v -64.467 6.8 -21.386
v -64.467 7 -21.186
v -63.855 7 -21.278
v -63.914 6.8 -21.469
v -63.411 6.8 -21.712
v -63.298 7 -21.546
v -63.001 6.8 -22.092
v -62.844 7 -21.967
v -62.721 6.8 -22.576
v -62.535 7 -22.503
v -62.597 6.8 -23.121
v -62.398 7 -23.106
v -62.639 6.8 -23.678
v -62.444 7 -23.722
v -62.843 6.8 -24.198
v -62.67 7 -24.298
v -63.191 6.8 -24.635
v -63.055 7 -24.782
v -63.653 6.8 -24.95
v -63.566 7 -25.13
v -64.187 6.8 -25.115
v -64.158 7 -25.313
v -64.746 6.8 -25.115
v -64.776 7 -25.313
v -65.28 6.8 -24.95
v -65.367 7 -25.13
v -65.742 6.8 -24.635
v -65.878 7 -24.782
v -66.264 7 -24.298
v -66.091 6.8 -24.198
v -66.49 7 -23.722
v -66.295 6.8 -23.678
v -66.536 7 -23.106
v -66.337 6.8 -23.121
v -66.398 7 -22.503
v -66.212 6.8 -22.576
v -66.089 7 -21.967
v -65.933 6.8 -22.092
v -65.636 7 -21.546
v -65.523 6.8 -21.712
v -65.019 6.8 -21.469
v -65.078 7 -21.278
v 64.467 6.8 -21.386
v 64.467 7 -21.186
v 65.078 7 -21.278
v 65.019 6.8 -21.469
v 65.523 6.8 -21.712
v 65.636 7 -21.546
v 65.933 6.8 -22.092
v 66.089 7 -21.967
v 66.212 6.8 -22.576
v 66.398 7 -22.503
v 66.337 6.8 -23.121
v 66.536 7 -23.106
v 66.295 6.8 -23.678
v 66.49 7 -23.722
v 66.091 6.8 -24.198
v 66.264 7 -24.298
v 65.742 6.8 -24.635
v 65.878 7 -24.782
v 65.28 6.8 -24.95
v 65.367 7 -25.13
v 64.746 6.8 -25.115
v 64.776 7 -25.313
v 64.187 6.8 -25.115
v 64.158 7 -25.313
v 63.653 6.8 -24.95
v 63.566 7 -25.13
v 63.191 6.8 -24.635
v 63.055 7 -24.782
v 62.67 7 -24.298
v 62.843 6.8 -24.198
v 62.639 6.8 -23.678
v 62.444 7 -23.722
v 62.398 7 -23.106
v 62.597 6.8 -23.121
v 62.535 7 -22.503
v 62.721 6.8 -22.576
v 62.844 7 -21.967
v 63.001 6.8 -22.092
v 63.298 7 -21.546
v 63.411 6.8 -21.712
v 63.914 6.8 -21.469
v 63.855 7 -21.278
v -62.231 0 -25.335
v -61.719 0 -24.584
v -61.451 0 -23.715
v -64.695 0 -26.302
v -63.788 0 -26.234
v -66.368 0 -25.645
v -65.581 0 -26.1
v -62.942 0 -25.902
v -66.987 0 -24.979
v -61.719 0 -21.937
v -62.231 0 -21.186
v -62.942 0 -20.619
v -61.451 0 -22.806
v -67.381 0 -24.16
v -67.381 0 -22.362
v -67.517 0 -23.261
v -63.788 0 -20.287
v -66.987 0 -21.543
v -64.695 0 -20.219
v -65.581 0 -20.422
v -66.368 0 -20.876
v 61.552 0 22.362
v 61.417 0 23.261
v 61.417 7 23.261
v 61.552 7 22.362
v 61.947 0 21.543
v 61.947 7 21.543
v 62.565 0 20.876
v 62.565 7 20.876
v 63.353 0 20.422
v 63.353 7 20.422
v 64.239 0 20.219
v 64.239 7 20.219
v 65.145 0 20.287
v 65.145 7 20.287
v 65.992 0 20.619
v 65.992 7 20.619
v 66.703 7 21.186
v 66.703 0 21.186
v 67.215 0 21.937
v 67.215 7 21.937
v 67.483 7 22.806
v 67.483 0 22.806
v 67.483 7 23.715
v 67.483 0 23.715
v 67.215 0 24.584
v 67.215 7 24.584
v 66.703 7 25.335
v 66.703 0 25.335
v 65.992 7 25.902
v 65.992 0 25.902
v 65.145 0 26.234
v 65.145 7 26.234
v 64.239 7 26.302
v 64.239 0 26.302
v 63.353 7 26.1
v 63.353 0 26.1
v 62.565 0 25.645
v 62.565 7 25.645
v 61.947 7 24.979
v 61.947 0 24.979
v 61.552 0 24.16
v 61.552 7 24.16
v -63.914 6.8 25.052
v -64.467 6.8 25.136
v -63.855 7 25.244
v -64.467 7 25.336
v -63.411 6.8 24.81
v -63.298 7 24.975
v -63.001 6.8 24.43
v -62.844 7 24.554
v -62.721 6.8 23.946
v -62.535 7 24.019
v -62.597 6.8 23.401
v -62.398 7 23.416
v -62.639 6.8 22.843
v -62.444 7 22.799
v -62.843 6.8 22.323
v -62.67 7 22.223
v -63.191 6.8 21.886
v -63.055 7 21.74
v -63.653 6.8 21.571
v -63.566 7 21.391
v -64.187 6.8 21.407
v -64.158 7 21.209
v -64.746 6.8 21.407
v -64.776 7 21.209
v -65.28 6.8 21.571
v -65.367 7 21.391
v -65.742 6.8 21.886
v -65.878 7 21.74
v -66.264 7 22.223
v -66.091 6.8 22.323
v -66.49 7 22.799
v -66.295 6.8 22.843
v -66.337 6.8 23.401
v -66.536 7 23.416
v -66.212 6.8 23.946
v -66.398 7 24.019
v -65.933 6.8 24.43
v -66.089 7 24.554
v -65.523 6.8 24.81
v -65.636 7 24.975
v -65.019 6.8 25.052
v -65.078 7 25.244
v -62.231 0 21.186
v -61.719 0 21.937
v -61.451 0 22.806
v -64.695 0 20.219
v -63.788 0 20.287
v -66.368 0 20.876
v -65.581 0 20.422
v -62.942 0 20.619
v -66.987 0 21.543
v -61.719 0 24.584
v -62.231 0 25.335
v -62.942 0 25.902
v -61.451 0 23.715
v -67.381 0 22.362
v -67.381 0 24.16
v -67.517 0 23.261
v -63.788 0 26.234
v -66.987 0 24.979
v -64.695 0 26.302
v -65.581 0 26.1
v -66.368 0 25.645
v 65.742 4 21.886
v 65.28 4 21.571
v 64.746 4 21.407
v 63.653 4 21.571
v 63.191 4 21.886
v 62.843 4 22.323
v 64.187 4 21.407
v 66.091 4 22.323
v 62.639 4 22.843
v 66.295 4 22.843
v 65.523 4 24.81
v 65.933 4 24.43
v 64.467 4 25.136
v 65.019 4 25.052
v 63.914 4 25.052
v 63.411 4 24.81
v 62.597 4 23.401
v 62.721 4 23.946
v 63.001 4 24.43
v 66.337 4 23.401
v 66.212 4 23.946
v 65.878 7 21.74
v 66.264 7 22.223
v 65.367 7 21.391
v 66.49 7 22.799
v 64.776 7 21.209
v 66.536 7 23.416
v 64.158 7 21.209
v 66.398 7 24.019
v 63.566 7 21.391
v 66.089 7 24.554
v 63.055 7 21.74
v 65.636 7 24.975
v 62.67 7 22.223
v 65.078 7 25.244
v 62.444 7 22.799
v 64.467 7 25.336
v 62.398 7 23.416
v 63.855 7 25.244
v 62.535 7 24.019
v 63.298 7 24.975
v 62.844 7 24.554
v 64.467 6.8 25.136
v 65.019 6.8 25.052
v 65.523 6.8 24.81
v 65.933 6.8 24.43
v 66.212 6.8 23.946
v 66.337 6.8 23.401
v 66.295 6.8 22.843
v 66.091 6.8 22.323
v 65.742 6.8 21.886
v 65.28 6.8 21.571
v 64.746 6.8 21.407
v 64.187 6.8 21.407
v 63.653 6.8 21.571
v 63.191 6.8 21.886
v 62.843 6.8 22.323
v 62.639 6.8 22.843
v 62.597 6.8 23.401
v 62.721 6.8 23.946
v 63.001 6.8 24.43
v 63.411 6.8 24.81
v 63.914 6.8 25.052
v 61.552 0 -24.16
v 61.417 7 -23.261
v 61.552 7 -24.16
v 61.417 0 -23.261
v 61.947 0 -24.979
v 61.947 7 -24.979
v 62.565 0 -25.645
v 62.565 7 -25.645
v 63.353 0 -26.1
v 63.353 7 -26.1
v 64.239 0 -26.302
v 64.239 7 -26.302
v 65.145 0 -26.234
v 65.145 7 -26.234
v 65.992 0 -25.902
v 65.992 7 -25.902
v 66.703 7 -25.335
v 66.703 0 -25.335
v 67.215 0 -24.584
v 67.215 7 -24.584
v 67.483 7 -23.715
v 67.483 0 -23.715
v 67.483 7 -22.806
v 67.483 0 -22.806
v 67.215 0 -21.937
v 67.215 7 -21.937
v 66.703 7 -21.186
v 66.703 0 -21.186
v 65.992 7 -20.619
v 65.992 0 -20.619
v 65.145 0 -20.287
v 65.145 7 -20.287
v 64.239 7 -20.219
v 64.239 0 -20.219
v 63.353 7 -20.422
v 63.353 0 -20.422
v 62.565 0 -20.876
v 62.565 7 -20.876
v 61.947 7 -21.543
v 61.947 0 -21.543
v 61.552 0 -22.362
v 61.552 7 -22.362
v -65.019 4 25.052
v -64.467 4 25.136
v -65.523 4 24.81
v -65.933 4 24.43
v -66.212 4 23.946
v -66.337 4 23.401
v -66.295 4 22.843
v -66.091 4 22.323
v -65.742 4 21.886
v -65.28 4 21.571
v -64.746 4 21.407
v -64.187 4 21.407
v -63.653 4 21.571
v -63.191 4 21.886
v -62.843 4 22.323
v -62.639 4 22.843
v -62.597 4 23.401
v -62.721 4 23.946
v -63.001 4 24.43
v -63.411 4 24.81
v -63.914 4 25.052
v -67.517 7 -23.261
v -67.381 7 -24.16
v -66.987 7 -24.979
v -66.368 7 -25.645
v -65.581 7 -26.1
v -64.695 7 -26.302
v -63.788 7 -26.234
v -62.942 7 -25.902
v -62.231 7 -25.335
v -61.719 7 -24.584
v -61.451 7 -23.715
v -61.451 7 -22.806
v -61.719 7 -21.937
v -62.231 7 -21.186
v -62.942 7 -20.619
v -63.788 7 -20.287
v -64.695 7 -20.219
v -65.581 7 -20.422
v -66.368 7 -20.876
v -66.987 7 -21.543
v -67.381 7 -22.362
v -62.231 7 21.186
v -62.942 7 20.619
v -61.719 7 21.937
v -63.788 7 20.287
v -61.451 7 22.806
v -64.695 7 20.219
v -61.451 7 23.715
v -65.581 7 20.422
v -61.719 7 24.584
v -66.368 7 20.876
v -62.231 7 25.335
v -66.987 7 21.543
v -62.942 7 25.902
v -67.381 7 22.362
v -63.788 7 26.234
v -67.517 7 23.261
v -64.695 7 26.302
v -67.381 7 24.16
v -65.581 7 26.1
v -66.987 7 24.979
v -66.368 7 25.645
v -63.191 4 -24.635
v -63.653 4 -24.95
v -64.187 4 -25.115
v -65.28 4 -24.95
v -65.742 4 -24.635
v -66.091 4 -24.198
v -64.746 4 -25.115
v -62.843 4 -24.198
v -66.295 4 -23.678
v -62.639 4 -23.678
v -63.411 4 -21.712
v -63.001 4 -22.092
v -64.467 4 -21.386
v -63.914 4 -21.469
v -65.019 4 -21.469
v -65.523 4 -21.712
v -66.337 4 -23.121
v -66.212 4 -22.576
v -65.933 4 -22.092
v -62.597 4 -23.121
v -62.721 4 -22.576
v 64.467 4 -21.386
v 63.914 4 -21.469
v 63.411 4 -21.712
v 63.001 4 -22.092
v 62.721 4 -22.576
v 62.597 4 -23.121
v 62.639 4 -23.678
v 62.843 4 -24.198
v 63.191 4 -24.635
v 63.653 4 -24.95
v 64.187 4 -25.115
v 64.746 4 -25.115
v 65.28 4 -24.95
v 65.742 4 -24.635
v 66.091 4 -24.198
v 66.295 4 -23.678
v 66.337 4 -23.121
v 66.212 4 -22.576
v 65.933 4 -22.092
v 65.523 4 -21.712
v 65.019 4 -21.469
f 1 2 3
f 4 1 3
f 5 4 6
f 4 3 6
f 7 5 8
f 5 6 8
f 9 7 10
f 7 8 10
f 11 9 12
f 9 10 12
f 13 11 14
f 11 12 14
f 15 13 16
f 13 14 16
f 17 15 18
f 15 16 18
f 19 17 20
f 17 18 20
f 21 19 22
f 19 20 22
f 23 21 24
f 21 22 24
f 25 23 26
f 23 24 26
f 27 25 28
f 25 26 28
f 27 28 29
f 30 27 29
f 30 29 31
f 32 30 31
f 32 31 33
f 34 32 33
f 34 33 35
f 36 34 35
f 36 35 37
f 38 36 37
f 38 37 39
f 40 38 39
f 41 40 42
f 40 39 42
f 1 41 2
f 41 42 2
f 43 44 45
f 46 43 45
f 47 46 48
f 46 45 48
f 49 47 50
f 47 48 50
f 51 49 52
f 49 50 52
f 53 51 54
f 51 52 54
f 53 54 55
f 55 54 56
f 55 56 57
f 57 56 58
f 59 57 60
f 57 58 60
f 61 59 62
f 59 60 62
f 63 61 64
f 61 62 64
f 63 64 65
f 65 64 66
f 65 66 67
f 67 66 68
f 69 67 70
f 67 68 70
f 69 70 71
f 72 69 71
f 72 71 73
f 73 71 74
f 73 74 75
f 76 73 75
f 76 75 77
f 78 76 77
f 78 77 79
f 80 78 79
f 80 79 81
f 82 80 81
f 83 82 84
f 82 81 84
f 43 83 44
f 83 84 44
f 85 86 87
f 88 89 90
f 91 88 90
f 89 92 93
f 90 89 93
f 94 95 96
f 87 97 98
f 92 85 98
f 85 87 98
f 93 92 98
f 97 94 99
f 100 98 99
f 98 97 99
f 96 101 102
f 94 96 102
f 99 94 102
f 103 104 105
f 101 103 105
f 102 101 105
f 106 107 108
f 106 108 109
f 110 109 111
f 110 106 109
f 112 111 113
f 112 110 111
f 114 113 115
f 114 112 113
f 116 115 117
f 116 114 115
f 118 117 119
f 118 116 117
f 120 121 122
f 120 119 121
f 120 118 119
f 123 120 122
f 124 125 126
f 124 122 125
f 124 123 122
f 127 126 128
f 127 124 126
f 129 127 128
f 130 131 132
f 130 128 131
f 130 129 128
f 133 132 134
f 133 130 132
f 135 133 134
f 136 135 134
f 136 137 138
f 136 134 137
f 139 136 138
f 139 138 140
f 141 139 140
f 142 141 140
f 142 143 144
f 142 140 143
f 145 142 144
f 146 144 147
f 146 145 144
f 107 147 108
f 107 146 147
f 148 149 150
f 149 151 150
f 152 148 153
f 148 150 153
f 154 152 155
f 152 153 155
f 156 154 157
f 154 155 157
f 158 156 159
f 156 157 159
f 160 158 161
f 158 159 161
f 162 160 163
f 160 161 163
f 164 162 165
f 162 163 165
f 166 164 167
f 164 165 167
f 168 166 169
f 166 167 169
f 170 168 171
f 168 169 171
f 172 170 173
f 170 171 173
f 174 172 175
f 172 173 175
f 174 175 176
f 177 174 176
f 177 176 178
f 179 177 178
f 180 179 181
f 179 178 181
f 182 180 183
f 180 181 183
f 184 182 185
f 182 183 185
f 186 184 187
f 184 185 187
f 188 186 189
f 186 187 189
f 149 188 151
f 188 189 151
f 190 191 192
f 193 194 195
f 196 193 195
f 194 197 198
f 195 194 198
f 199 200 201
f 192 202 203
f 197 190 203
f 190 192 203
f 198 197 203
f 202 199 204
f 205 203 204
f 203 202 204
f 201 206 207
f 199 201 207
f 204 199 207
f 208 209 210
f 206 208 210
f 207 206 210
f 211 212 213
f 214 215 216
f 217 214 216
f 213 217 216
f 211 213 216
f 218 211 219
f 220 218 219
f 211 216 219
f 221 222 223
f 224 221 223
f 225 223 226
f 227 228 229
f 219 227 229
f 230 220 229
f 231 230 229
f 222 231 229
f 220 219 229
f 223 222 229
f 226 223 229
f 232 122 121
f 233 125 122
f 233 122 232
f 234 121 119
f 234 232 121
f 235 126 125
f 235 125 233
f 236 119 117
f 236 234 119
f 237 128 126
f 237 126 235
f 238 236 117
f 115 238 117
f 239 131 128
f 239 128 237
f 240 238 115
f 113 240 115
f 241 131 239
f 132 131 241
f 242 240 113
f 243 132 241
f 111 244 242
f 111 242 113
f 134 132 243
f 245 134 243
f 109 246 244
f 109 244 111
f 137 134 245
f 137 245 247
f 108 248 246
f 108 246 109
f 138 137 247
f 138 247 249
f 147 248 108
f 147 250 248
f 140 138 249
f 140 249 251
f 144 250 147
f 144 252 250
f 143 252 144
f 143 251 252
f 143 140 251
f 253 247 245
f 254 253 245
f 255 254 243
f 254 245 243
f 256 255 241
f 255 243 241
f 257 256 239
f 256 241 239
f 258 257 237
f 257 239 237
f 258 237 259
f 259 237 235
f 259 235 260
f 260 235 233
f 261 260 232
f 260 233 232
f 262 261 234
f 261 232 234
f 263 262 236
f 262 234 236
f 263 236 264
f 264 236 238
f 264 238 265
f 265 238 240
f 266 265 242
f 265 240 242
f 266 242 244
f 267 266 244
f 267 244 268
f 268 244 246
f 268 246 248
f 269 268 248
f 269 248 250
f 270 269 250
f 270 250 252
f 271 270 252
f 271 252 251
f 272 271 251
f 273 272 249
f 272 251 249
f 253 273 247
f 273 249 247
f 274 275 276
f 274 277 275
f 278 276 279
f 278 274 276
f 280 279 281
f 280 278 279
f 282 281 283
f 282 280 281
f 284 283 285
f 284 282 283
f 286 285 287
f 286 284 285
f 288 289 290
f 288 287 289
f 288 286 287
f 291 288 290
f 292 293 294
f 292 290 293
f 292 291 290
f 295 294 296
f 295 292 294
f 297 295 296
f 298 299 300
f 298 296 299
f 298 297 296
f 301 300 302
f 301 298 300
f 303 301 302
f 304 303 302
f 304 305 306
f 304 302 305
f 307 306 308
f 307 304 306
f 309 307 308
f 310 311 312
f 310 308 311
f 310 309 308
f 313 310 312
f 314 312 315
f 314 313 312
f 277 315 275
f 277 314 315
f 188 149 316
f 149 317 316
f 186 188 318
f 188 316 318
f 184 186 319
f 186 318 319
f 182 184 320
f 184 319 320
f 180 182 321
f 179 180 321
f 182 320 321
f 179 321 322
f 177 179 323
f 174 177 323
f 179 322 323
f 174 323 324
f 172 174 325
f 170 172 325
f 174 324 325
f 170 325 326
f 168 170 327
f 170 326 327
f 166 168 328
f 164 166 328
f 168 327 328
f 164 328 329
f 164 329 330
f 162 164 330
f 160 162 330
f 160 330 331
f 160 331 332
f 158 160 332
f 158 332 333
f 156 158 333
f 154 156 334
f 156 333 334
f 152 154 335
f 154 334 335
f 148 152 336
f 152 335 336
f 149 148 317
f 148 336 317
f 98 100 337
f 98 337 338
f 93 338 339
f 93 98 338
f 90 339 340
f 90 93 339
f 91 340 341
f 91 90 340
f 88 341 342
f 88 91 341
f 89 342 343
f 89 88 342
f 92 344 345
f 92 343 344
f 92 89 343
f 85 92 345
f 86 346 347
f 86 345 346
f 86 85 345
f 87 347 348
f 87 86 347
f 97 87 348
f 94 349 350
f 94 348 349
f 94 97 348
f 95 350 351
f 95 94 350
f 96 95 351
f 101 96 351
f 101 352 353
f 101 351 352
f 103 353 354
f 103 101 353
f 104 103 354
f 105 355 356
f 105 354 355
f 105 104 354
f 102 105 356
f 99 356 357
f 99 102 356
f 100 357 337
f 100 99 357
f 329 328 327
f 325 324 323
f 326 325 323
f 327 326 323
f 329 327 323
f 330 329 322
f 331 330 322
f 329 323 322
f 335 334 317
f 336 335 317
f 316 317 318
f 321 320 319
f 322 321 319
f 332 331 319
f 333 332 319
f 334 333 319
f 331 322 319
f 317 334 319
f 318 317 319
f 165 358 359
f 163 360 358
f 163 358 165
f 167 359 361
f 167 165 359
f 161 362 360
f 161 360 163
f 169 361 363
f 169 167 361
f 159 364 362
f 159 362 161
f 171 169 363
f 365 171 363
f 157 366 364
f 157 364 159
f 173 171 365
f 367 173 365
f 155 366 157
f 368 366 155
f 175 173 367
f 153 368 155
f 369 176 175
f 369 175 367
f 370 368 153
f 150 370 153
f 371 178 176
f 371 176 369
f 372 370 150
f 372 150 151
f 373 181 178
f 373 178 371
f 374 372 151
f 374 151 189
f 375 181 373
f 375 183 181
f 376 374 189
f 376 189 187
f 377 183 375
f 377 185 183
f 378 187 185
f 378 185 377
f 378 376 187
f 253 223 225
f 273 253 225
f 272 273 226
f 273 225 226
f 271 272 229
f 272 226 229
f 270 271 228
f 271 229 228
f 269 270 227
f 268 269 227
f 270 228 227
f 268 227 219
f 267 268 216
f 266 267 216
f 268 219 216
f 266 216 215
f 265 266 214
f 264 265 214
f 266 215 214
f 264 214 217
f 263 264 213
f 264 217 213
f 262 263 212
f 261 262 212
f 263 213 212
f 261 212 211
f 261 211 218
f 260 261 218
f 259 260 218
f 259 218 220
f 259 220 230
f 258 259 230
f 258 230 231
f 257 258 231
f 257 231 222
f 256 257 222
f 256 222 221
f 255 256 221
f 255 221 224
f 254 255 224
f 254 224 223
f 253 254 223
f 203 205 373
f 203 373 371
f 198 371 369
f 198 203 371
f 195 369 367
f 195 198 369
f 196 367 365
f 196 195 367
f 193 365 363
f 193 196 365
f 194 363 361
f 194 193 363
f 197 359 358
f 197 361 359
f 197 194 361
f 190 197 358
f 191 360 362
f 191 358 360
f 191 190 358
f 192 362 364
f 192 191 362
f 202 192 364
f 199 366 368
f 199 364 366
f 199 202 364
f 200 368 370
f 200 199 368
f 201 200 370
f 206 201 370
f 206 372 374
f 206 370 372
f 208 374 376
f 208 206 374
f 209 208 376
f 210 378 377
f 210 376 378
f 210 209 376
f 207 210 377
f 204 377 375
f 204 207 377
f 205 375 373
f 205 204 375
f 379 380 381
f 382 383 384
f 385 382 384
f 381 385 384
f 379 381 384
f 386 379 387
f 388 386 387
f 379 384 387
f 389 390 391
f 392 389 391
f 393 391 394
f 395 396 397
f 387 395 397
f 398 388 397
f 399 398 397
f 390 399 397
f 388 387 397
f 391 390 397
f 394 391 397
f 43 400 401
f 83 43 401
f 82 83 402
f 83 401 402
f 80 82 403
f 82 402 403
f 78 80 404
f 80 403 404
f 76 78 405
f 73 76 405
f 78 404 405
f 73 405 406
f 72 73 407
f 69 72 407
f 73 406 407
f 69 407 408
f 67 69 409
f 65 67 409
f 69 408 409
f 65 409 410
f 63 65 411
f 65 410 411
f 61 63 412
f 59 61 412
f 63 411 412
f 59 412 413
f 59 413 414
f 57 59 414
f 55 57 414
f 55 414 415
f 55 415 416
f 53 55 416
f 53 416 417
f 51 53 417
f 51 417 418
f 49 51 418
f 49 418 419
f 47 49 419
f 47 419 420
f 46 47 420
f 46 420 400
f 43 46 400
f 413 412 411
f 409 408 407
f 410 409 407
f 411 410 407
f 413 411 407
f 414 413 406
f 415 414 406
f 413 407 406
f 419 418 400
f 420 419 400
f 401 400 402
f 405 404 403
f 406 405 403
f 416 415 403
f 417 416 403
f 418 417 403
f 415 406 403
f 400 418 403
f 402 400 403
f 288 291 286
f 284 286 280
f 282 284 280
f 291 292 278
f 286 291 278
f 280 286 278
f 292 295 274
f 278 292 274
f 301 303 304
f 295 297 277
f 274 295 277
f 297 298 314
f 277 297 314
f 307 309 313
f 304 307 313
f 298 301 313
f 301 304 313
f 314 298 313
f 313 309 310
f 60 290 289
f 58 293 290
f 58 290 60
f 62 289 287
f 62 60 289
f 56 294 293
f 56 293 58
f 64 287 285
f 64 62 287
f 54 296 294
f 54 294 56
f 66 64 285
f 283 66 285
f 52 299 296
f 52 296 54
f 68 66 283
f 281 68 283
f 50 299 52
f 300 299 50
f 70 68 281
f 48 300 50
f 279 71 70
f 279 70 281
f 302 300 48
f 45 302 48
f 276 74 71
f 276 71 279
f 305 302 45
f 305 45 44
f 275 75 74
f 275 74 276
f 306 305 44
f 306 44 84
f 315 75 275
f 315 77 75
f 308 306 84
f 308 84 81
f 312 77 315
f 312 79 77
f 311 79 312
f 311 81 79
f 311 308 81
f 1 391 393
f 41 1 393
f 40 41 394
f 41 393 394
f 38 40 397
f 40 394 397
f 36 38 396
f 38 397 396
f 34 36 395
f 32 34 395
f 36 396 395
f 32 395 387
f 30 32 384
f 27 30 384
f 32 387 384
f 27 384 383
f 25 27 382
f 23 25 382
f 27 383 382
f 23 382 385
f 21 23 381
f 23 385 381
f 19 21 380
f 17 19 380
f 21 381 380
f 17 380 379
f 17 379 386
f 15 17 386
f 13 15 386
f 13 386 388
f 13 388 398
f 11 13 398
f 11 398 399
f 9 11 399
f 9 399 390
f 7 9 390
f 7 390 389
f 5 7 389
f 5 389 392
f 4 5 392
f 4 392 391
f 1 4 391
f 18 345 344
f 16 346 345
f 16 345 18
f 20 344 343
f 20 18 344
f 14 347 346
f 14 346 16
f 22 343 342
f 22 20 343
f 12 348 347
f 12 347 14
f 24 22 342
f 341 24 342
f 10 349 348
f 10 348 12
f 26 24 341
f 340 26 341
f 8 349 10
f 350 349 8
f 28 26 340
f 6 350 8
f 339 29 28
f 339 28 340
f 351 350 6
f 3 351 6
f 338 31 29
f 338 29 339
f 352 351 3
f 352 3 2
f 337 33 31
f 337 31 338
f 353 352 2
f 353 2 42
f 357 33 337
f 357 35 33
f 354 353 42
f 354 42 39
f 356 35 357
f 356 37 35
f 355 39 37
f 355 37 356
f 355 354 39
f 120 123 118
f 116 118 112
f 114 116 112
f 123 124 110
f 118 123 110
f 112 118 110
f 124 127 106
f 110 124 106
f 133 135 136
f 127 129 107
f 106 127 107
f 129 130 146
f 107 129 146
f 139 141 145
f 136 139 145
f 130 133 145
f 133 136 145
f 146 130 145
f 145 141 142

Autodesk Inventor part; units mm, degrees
ref_plane "YZ Plane" through (0, 0, 0) normal (1, 0, 0) x (0, 1, 0)
ref_plane "XZ Plane" through (0, 0, 0) normal (0, 1, 0) x (-1, 0, 0)
ref_plane "XY Plane" through (0, 0, 0) normal (0, 0, 1) x (1, 0, 0)
sketch "Sketch1" plane through (0, 0, 0) normal (0, 1, 0) x (-1, 0, 0)
  line L0 (64.4668, 23.2607) -> (-64.4668, 23.2607) construction
  line L1 (-64.4668, 23.2607) -> (-64.4668, -23.2607) construction
  line L2 (-64.4668, -23.2607) -> (64.4668, -23.2607) construction
  line L3 (64.4668, -23.2607) -> (64.4668, 23.2607) construction
  line L4 (64.4668, 23.2607) -> (-64.4668, -23.2607) construction
  line L5 (-64.4668, 23.2607) -> (64.4668, -23.2607) construction
  circle A0 centre (64.4668, -23.2607) radius 1.55 construction
  line L6 (0, -23.2607) -> (0, 23.2607) construction
  line L7 (64.4668, 0) -> (-64.4668, 0) construction
  circle A1 centre (-64.4668, -23.2607) radius 1.55 construction
  circle A2 centre (64.4668, 23.2607) radius 1.55 construction
  circle A3 centre (-64.4668, 23.2607) radius 1.55 construction
  line L8 (67.4168, -26.2107) -> (-67.4168, -26.2107) construction
  line L9 (-67.4168, -26.2107) -> (-67.4168, 26.2107) construction
  line L10 (-67.4168, 26.2107) -> (67.4168, 26.2107) construction
  line L11 (67.4168, 26.2107) -> (67.4168, -26.2107) construction
  line L12 (66.0168, -23.2607) -> (67.4168, -23.2607) construction
  line L13 (-64.4668, 24.8107) -> (-64.4668, 26.2107) construction
  line L14 (-66.0168, 23.2607) -> (-67.4168, 23.2607) construction
  point P0 (0, 0)
  dimension "d2" = 3.1
  dimension "d0" = 46.5214
  dimension "d1" = 128.9336
  dimension "d5" = 1.4
  dimension "d6" = 1.4
  dimension "d7" = 1.4
  dimension "d8" = 1.4
sketch "Sketch2" plane through (0, 0, 0) normal (0, 1, 0) x (-1, 0, 0)
  circle A0 centre (64.4668, -23.2607) radius 1.55 construction
  circle A1 centre (-64.4668, -23.2607) radius 1.55 construction
  circle A2 centre (-64.4668, 23.2607) radius 1.55 construction
  circle A3 centre (64.4668, 23.2607) radius 1.55 construction
  circle A4 centre (64.4668, -23.2607) radius 3.05
  circle A5 centre (-64.4668, -23.2607) radius 3.05
  circle A6 centre (-64.4668, 23.2607) radius 3.05
  circle A7 centre (64.4668, 23.2607) radius 3.05
  point P0 (0, 0)
  dimension "d9" = 1.5
extrude "Extrusion2" add sketch "Sketch2" along normal blind 7
sketch "Sketch3" plane through (-64.4668, 7, -23.2607) normal (0, 1, 0) x (1, 0, 0)
  circle A0 centre (0, 0) radius 3.05 projected
  circle A1 centre (128.9336, 0) radius 3.05 projected
  circle A2 centre (128.9336, -46.5214) radius 3.05 projected
  circle A3 centre (0, -46.5214) radius 3.05 projected
  point P0 (64.4668, -23.2607)
hole "Hole1" at (-64.4668, 7, -23.2607) at (64.4668, 7, -23.2607) at (64.4668, 7, 23.2607) at (-64.4668, 7, 23.2607) direction (0, -1, 0) diameter 3.75 depth 3
chamfer "Chamfer1" distance 0.2 angle 45 4 edges at (-64.4668, 7, 21.3857) (64.4668, 7, 21.3857) (64.4668, 7, -25.1357) (-64.4668, 7, -25.1357)
properties part number "relay_module_standoffs"
